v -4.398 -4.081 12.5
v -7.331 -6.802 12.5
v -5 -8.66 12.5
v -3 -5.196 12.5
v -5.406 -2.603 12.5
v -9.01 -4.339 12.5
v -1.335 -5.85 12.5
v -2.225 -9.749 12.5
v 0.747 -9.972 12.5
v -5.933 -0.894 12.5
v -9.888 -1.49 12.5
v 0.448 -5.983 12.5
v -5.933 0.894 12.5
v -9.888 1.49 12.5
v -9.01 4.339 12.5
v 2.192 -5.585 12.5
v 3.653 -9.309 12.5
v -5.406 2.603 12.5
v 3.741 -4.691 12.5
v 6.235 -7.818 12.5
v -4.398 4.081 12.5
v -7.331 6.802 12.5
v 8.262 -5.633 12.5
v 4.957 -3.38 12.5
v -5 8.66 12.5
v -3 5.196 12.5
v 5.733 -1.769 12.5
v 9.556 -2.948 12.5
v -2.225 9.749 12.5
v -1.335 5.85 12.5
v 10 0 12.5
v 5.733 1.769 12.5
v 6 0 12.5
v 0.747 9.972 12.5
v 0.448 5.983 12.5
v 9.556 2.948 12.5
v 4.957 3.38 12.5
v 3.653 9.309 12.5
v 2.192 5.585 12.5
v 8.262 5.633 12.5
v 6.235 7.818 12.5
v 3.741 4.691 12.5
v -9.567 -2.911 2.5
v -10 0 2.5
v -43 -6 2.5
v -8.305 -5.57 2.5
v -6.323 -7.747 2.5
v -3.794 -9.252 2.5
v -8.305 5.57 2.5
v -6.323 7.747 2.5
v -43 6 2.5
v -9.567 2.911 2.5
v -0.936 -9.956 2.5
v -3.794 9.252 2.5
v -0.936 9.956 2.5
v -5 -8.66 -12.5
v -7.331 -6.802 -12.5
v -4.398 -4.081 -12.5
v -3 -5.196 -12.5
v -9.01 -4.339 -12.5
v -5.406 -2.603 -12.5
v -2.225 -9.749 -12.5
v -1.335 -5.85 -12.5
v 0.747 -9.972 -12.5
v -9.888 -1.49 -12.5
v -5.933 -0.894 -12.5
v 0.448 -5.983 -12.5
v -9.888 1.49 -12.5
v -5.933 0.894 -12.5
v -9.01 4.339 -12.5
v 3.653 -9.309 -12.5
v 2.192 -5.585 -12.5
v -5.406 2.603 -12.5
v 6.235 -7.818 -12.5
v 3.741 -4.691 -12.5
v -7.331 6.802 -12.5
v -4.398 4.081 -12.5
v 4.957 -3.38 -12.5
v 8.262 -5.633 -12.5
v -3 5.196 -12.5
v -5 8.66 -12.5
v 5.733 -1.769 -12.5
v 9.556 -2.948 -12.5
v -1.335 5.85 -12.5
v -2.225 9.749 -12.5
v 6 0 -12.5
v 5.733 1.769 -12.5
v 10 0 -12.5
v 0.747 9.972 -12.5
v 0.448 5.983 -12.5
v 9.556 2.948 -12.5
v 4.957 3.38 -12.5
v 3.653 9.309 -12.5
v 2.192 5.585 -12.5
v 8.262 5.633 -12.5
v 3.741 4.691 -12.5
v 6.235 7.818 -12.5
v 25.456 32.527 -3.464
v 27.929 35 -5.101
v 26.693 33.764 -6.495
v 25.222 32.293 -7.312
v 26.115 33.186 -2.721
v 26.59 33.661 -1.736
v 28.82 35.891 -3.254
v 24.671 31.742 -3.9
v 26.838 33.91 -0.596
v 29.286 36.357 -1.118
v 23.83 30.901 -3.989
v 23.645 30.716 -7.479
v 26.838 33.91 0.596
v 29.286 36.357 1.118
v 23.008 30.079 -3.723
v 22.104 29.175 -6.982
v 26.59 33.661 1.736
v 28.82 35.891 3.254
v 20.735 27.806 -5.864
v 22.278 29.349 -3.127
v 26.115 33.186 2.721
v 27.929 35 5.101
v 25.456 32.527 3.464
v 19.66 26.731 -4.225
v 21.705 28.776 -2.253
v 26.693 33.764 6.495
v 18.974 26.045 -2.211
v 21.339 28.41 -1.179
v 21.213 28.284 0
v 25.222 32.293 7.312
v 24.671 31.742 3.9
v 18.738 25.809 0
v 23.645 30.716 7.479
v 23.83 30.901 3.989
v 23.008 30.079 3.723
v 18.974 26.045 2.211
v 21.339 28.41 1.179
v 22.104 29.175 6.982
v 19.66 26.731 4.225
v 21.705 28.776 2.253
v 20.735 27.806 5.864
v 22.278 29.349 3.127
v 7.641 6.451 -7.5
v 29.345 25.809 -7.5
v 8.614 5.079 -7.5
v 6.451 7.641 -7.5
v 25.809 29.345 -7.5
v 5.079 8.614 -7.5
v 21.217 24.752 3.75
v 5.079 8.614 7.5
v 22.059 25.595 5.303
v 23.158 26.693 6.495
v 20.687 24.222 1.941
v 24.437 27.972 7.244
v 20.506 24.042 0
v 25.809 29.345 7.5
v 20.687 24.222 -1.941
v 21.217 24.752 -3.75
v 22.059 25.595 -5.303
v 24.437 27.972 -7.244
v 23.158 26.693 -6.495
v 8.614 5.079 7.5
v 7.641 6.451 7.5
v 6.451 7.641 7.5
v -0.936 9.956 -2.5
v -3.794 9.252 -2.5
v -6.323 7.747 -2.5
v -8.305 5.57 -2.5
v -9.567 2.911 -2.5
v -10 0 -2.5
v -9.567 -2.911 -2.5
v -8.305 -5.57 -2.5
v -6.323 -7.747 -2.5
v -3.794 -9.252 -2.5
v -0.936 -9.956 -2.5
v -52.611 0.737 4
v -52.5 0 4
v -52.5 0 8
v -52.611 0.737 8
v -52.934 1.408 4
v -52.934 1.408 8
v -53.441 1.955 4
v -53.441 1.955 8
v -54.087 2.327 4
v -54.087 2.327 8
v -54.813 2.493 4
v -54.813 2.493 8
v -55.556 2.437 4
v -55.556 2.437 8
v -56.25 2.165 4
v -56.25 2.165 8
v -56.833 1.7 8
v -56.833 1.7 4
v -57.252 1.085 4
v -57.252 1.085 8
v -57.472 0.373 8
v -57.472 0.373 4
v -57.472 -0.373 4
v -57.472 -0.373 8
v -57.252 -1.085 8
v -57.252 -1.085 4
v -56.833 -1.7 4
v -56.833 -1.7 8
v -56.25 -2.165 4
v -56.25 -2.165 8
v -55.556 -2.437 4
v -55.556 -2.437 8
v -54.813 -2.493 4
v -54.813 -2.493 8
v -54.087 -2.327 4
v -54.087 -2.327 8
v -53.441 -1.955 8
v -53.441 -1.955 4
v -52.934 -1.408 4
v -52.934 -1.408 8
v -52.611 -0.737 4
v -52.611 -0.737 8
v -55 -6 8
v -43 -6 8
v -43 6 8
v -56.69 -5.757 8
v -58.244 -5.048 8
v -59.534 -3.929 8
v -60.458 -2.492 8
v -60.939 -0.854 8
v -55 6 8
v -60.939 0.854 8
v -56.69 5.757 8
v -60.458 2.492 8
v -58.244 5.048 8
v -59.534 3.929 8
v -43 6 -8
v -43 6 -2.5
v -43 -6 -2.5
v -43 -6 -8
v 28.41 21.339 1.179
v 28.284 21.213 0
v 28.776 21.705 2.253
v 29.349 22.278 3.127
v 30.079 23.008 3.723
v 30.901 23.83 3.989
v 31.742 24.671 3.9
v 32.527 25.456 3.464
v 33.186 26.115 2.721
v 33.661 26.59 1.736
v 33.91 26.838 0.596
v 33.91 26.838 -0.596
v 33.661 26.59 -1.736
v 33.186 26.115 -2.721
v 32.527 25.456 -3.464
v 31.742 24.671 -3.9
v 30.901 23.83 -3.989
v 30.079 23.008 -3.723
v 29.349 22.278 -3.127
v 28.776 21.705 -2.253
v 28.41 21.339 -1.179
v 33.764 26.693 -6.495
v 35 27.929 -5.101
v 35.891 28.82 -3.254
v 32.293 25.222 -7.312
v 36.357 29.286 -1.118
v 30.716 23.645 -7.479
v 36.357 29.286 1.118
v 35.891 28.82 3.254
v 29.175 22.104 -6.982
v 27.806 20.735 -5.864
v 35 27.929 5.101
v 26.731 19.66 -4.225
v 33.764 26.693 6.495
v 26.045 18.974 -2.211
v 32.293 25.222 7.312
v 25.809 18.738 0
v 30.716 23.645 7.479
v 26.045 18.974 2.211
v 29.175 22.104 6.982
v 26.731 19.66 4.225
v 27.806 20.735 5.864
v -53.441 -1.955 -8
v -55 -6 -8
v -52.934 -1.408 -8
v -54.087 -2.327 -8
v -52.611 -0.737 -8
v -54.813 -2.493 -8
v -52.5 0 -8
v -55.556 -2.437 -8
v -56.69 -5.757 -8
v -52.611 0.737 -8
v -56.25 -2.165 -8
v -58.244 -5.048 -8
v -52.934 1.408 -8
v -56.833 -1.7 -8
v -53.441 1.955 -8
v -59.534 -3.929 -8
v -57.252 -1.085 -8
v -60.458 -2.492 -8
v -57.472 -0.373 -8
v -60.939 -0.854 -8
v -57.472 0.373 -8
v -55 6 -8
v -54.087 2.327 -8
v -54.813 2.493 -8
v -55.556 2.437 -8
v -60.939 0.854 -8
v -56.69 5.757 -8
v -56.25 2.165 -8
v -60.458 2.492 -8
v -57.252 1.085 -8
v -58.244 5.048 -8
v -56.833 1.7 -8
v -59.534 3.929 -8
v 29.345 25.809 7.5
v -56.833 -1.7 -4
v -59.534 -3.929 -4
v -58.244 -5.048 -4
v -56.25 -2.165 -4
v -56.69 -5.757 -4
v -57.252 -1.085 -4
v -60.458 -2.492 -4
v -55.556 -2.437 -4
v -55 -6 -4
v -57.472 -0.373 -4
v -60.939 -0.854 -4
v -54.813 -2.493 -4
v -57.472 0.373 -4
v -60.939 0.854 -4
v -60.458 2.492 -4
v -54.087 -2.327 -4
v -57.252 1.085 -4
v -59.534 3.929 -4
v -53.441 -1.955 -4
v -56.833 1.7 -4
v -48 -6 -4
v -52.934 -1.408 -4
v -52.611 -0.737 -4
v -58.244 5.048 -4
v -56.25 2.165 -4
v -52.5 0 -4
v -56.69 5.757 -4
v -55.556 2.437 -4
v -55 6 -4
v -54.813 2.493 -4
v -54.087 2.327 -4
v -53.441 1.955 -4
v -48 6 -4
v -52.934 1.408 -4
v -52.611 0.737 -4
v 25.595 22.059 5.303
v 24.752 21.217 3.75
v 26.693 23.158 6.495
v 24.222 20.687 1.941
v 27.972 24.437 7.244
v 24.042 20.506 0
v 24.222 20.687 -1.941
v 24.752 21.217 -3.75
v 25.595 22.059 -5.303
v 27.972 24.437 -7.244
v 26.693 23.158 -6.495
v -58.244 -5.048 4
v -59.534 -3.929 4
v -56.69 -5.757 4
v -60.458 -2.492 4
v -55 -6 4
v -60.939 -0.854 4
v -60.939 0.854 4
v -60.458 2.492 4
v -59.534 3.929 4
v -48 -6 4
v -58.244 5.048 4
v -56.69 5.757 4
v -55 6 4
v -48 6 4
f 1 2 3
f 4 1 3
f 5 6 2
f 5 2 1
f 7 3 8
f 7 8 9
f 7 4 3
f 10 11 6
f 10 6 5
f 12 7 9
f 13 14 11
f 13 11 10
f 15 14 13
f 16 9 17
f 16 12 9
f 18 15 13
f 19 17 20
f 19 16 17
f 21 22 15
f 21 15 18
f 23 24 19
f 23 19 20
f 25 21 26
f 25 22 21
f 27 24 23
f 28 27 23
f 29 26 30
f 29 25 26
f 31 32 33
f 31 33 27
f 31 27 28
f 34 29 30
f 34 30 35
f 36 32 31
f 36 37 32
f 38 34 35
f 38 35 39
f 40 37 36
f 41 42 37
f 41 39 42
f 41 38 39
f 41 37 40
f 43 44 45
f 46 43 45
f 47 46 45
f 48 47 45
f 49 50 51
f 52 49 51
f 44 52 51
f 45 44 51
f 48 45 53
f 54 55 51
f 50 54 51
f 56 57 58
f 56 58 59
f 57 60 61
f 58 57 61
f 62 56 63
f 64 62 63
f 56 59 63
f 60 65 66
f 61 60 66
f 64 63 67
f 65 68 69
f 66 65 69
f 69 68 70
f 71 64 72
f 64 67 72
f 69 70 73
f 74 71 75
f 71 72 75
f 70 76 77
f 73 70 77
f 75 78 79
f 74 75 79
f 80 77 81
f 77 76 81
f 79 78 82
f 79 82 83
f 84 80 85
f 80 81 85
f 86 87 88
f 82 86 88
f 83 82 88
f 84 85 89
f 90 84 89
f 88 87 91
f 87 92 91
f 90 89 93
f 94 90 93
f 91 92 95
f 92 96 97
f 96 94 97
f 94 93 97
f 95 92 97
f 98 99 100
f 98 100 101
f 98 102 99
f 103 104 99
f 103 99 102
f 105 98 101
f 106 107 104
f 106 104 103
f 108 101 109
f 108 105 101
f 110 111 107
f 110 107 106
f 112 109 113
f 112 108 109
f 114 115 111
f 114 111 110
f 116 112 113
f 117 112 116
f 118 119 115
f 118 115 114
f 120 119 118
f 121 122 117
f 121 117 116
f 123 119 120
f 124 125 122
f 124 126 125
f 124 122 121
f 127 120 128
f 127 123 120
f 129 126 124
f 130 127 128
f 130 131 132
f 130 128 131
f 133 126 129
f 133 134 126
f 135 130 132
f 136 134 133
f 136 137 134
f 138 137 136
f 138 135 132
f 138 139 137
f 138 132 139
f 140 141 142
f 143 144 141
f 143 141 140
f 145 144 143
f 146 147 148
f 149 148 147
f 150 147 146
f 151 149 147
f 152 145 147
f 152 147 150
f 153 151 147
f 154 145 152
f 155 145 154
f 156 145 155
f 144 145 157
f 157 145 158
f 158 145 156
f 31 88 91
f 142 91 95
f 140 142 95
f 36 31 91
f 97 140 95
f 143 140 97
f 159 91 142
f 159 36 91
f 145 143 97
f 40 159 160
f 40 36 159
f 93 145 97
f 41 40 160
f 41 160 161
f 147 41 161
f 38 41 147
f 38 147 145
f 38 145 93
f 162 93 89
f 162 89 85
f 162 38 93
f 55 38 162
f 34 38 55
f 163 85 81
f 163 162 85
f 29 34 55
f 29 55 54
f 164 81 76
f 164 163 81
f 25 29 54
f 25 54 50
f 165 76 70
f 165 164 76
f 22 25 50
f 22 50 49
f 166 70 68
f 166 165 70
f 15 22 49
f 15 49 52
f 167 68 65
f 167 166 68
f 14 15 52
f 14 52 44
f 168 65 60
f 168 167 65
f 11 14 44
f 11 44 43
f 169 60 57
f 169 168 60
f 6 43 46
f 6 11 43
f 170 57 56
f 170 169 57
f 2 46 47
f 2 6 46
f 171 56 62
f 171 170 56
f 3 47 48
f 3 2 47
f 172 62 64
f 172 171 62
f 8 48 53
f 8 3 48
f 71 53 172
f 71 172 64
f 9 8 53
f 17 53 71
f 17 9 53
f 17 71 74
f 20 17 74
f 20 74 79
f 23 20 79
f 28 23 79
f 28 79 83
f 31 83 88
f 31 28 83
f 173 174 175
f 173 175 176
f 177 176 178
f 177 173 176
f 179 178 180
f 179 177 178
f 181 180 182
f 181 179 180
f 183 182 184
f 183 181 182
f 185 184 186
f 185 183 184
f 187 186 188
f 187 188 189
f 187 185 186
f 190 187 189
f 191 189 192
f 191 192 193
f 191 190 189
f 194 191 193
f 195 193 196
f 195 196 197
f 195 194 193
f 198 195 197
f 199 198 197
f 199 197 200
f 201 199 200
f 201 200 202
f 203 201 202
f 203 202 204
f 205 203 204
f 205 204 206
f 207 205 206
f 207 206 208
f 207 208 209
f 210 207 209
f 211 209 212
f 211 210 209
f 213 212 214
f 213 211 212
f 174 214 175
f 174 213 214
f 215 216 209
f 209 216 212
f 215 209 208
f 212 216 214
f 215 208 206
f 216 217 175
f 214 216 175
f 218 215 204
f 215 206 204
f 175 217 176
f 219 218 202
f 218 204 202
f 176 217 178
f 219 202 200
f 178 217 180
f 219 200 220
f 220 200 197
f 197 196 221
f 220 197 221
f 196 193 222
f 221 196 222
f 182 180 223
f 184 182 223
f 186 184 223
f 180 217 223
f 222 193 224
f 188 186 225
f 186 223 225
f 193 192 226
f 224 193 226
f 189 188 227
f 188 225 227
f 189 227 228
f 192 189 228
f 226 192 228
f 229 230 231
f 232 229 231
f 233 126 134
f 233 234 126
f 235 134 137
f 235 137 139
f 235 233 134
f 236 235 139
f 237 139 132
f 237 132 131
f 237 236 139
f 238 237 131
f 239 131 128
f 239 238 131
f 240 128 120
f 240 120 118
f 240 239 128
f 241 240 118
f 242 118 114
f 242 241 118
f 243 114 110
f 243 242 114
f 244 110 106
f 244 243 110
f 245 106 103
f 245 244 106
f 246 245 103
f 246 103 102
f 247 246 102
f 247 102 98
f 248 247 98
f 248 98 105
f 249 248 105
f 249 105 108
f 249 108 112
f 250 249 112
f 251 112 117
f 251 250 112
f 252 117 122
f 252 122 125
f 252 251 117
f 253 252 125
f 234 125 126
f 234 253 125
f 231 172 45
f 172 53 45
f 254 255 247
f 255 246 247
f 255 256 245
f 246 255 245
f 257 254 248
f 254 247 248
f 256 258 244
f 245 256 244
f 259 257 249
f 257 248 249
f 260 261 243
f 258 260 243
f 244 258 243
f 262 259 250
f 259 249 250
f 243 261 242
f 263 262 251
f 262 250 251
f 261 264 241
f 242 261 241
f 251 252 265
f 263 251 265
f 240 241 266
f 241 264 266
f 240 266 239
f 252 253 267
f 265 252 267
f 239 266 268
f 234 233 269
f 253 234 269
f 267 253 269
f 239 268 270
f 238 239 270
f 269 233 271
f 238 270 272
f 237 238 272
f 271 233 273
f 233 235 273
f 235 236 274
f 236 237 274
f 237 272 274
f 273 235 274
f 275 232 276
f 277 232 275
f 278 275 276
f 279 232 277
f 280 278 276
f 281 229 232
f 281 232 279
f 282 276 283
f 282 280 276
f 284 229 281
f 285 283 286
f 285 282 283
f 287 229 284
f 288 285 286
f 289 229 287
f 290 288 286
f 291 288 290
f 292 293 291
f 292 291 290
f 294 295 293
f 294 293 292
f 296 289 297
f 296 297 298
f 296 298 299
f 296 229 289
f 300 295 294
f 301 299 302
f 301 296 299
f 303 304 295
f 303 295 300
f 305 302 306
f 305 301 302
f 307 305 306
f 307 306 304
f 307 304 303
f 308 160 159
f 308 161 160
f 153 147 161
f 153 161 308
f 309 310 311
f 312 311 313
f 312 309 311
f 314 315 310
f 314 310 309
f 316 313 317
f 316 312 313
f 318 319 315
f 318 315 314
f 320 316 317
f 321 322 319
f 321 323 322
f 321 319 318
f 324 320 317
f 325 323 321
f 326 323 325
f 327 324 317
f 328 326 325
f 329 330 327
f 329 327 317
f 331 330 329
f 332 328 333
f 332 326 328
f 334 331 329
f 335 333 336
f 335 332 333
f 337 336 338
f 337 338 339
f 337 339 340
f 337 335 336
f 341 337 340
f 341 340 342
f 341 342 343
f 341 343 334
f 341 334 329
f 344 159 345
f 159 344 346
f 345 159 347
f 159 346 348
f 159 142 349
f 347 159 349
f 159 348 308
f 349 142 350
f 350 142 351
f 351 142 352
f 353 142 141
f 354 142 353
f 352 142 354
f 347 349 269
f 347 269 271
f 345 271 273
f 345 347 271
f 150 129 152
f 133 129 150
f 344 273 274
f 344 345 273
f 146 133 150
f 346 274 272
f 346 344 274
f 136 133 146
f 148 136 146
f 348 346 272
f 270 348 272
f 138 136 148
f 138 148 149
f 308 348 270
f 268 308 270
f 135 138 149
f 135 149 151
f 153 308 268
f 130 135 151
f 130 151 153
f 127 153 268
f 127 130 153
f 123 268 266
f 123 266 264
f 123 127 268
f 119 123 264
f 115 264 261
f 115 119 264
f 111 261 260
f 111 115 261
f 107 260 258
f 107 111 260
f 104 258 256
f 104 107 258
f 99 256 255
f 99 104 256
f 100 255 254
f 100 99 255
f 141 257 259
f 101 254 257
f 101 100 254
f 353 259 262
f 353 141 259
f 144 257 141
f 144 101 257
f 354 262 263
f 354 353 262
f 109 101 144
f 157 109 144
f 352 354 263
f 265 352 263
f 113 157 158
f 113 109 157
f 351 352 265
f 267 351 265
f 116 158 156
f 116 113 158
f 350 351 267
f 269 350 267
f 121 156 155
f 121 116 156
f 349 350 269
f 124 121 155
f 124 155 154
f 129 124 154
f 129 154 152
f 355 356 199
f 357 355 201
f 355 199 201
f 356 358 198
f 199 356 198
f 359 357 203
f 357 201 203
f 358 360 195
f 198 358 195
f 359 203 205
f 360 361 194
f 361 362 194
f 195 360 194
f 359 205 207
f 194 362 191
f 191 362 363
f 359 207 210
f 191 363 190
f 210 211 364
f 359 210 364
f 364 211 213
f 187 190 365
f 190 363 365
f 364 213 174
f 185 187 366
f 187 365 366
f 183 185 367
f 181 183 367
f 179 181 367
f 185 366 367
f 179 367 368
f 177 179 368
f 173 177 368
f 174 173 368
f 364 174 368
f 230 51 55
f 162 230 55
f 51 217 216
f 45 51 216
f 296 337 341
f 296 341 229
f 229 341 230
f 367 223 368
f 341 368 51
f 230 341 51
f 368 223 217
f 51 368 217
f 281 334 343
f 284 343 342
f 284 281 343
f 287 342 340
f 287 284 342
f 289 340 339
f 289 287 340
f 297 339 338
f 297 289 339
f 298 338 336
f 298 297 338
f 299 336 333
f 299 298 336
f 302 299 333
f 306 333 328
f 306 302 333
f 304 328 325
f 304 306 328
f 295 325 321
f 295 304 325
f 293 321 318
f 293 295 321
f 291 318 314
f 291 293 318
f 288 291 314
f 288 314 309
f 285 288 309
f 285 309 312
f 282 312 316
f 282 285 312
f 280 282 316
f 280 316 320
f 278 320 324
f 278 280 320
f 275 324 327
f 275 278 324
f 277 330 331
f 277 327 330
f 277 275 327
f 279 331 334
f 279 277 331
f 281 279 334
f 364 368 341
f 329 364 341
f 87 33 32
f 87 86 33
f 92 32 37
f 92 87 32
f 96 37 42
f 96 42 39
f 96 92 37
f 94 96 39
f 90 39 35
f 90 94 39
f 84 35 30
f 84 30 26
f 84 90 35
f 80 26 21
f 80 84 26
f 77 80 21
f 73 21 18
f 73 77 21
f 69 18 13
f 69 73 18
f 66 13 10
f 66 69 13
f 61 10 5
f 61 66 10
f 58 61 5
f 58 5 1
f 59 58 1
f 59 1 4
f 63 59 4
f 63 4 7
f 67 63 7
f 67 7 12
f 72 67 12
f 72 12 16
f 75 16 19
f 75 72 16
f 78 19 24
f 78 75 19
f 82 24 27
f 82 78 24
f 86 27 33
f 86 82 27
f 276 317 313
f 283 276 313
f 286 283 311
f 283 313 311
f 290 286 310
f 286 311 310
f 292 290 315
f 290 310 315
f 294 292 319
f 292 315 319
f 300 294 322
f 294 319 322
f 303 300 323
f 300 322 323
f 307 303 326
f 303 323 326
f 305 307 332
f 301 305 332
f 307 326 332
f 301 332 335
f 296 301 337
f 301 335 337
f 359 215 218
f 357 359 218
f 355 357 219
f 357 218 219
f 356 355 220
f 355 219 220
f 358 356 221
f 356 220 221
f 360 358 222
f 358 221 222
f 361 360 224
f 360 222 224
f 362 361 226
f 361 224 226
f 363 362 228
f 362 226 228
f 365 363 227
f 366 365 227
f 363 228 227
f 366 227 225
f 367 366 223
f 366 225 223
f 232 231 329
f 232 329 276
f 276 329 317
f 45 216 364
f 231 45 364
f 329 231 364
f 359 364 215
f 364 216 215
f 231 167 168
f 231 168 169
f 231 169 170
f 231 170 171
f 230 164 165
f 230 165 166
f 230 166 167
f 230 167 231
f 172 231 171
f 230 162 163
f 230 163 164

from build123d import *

# Parameters (mm, degrees)
SKETCH1_R           = 10
SKETCH1_R_2         = 6
BOSS_EXTRUDE1_DEPTH = 12.5
BOSS_EXTRUDE2_DEPTH = 2.5
SKETCH2_3_R         = 2.5
BOSS_EXTRUDE3_DEPTH = 8
SKETCH3_W           = 13
SKETCH3_H           = 8
CUT_EXTRUDE1_DEPTH  = 65.290356975
BOSS_EXTRUDE4_DEPTH = 2.5
SKETCH4_5_R         = 4
BOSS_EXTRUDE5_DEPTH = 5


with BuildPart() as part:
    # Sketch1 → Boss-Extrude1 (new, symmetric)
    with BuildSketch(Plane.XY):
        Circle(SKETCH1_R)
        Circle(SKETCH1_R_2, mode=Mode.SUBTRACT)
    extrude(amount=BOSS_EXTRUDE1_DEPTH, both=True)

    # Sketch2 → Boss-Extrude2 (add, symmetric)
    with BuildSketch(Plane.XY):
        with BuildLine():
            Line((-0.936363066, 9.956064695), (-43, 6))
            Line((-43, 6), (-43, -6))
            Line((-43, -6), (-0.936363066, -9.956064695))
            ThreePointArc((-0.936363066, -9.956064695), (-10, 0), (-0.936363066, 9.956064695))
        make_face()
    extrude(amount=BOSS_EXTRUDE2_DEPTH, both=True)

    # Sketch2<3> → Boss-Extrude3 (add, symmetric)
    with BuildSketch(Plane.XY):
        with BuildLine():
            Line((-43, 6), (-55, 6))
            ThreePointArc((-55, 6), (-61, 0), (-55, -6))
            Line((-55, -6), (-43, -6))
            Line((-43, -6), (-43, 6))
        make_face()
        with Locations((-55, 0)):
            Circle(SKETCH2_3_R, mode=Mode.SUBTRACT)
    extrude(amount=BOSS_EXTRUDE3_DEPTH, both=True)

    # Sketch3 → Cut-Extrude1 (cut, through all)
    with BuildSketch(Plane(origin=(0, 6, 0), x_dir=(1, 0, 0), z_dir=(0, 1, 0))):
        with Locations((-54.5, 0)):
            Rectangle(SKETCH3_W, SKETCH3_H)
    extrude(amount=-CUT_EXTRUDE1_DEPTH, mode=Mode.SUBTRACT)

    # Sketch4 → Boss-Extrude4 (add, symmetric)
    with BuildSketch(Plane(origin=(0, 0, 0), x_dir=(0.7071067811865512, 0.7071067811865438, 0), z_dir=(-0.7071067811865438, 0.7071067811865512, 0))):
        with BuildLine():
            Line((39, 7.5), (8.997395084, 7.5))
            Line((8.997395084, 7.5), (8.997395084, -7.5))
            Line((8.997395084, -7.5), (39, -7.5))
            ThreePointArc((39, -7.5), (31.5, 0), (39, 7.5))
        make_face()
    extrude(amount=BOSS_EXTRUDE4_DEPTH, both=True)

    # Sketch4<5> → Boss-Extrude5 (add, symmetric)
    with BuildSketch(Plane(origin=(0, 0, 0), x_dir=(0.7071067811865512, 0.7071067811865438, 0), z_dir=(-0.7071067811865438, 0.7071067811865512, 0))):
        with BuildLine():
            ThreePointArc((46.5, 0), (44.303300859, 5.303300859), (39, 7.5))
            ThreePointArc((39, 7.5), (31.5, 0), (39, -7.5))
            ThreePointArc((39, -7.5), (44.303300859, -5.303300859), (46.5, 0))
        make_face()
        with Locations((39, 0)):
            Circle(SKETCH4_5_R, mode=Mode.SUBTRACT)
    extrude(amount=BOSS_EXTRUDE5_DEPTH, both=True)


solid = part.part
